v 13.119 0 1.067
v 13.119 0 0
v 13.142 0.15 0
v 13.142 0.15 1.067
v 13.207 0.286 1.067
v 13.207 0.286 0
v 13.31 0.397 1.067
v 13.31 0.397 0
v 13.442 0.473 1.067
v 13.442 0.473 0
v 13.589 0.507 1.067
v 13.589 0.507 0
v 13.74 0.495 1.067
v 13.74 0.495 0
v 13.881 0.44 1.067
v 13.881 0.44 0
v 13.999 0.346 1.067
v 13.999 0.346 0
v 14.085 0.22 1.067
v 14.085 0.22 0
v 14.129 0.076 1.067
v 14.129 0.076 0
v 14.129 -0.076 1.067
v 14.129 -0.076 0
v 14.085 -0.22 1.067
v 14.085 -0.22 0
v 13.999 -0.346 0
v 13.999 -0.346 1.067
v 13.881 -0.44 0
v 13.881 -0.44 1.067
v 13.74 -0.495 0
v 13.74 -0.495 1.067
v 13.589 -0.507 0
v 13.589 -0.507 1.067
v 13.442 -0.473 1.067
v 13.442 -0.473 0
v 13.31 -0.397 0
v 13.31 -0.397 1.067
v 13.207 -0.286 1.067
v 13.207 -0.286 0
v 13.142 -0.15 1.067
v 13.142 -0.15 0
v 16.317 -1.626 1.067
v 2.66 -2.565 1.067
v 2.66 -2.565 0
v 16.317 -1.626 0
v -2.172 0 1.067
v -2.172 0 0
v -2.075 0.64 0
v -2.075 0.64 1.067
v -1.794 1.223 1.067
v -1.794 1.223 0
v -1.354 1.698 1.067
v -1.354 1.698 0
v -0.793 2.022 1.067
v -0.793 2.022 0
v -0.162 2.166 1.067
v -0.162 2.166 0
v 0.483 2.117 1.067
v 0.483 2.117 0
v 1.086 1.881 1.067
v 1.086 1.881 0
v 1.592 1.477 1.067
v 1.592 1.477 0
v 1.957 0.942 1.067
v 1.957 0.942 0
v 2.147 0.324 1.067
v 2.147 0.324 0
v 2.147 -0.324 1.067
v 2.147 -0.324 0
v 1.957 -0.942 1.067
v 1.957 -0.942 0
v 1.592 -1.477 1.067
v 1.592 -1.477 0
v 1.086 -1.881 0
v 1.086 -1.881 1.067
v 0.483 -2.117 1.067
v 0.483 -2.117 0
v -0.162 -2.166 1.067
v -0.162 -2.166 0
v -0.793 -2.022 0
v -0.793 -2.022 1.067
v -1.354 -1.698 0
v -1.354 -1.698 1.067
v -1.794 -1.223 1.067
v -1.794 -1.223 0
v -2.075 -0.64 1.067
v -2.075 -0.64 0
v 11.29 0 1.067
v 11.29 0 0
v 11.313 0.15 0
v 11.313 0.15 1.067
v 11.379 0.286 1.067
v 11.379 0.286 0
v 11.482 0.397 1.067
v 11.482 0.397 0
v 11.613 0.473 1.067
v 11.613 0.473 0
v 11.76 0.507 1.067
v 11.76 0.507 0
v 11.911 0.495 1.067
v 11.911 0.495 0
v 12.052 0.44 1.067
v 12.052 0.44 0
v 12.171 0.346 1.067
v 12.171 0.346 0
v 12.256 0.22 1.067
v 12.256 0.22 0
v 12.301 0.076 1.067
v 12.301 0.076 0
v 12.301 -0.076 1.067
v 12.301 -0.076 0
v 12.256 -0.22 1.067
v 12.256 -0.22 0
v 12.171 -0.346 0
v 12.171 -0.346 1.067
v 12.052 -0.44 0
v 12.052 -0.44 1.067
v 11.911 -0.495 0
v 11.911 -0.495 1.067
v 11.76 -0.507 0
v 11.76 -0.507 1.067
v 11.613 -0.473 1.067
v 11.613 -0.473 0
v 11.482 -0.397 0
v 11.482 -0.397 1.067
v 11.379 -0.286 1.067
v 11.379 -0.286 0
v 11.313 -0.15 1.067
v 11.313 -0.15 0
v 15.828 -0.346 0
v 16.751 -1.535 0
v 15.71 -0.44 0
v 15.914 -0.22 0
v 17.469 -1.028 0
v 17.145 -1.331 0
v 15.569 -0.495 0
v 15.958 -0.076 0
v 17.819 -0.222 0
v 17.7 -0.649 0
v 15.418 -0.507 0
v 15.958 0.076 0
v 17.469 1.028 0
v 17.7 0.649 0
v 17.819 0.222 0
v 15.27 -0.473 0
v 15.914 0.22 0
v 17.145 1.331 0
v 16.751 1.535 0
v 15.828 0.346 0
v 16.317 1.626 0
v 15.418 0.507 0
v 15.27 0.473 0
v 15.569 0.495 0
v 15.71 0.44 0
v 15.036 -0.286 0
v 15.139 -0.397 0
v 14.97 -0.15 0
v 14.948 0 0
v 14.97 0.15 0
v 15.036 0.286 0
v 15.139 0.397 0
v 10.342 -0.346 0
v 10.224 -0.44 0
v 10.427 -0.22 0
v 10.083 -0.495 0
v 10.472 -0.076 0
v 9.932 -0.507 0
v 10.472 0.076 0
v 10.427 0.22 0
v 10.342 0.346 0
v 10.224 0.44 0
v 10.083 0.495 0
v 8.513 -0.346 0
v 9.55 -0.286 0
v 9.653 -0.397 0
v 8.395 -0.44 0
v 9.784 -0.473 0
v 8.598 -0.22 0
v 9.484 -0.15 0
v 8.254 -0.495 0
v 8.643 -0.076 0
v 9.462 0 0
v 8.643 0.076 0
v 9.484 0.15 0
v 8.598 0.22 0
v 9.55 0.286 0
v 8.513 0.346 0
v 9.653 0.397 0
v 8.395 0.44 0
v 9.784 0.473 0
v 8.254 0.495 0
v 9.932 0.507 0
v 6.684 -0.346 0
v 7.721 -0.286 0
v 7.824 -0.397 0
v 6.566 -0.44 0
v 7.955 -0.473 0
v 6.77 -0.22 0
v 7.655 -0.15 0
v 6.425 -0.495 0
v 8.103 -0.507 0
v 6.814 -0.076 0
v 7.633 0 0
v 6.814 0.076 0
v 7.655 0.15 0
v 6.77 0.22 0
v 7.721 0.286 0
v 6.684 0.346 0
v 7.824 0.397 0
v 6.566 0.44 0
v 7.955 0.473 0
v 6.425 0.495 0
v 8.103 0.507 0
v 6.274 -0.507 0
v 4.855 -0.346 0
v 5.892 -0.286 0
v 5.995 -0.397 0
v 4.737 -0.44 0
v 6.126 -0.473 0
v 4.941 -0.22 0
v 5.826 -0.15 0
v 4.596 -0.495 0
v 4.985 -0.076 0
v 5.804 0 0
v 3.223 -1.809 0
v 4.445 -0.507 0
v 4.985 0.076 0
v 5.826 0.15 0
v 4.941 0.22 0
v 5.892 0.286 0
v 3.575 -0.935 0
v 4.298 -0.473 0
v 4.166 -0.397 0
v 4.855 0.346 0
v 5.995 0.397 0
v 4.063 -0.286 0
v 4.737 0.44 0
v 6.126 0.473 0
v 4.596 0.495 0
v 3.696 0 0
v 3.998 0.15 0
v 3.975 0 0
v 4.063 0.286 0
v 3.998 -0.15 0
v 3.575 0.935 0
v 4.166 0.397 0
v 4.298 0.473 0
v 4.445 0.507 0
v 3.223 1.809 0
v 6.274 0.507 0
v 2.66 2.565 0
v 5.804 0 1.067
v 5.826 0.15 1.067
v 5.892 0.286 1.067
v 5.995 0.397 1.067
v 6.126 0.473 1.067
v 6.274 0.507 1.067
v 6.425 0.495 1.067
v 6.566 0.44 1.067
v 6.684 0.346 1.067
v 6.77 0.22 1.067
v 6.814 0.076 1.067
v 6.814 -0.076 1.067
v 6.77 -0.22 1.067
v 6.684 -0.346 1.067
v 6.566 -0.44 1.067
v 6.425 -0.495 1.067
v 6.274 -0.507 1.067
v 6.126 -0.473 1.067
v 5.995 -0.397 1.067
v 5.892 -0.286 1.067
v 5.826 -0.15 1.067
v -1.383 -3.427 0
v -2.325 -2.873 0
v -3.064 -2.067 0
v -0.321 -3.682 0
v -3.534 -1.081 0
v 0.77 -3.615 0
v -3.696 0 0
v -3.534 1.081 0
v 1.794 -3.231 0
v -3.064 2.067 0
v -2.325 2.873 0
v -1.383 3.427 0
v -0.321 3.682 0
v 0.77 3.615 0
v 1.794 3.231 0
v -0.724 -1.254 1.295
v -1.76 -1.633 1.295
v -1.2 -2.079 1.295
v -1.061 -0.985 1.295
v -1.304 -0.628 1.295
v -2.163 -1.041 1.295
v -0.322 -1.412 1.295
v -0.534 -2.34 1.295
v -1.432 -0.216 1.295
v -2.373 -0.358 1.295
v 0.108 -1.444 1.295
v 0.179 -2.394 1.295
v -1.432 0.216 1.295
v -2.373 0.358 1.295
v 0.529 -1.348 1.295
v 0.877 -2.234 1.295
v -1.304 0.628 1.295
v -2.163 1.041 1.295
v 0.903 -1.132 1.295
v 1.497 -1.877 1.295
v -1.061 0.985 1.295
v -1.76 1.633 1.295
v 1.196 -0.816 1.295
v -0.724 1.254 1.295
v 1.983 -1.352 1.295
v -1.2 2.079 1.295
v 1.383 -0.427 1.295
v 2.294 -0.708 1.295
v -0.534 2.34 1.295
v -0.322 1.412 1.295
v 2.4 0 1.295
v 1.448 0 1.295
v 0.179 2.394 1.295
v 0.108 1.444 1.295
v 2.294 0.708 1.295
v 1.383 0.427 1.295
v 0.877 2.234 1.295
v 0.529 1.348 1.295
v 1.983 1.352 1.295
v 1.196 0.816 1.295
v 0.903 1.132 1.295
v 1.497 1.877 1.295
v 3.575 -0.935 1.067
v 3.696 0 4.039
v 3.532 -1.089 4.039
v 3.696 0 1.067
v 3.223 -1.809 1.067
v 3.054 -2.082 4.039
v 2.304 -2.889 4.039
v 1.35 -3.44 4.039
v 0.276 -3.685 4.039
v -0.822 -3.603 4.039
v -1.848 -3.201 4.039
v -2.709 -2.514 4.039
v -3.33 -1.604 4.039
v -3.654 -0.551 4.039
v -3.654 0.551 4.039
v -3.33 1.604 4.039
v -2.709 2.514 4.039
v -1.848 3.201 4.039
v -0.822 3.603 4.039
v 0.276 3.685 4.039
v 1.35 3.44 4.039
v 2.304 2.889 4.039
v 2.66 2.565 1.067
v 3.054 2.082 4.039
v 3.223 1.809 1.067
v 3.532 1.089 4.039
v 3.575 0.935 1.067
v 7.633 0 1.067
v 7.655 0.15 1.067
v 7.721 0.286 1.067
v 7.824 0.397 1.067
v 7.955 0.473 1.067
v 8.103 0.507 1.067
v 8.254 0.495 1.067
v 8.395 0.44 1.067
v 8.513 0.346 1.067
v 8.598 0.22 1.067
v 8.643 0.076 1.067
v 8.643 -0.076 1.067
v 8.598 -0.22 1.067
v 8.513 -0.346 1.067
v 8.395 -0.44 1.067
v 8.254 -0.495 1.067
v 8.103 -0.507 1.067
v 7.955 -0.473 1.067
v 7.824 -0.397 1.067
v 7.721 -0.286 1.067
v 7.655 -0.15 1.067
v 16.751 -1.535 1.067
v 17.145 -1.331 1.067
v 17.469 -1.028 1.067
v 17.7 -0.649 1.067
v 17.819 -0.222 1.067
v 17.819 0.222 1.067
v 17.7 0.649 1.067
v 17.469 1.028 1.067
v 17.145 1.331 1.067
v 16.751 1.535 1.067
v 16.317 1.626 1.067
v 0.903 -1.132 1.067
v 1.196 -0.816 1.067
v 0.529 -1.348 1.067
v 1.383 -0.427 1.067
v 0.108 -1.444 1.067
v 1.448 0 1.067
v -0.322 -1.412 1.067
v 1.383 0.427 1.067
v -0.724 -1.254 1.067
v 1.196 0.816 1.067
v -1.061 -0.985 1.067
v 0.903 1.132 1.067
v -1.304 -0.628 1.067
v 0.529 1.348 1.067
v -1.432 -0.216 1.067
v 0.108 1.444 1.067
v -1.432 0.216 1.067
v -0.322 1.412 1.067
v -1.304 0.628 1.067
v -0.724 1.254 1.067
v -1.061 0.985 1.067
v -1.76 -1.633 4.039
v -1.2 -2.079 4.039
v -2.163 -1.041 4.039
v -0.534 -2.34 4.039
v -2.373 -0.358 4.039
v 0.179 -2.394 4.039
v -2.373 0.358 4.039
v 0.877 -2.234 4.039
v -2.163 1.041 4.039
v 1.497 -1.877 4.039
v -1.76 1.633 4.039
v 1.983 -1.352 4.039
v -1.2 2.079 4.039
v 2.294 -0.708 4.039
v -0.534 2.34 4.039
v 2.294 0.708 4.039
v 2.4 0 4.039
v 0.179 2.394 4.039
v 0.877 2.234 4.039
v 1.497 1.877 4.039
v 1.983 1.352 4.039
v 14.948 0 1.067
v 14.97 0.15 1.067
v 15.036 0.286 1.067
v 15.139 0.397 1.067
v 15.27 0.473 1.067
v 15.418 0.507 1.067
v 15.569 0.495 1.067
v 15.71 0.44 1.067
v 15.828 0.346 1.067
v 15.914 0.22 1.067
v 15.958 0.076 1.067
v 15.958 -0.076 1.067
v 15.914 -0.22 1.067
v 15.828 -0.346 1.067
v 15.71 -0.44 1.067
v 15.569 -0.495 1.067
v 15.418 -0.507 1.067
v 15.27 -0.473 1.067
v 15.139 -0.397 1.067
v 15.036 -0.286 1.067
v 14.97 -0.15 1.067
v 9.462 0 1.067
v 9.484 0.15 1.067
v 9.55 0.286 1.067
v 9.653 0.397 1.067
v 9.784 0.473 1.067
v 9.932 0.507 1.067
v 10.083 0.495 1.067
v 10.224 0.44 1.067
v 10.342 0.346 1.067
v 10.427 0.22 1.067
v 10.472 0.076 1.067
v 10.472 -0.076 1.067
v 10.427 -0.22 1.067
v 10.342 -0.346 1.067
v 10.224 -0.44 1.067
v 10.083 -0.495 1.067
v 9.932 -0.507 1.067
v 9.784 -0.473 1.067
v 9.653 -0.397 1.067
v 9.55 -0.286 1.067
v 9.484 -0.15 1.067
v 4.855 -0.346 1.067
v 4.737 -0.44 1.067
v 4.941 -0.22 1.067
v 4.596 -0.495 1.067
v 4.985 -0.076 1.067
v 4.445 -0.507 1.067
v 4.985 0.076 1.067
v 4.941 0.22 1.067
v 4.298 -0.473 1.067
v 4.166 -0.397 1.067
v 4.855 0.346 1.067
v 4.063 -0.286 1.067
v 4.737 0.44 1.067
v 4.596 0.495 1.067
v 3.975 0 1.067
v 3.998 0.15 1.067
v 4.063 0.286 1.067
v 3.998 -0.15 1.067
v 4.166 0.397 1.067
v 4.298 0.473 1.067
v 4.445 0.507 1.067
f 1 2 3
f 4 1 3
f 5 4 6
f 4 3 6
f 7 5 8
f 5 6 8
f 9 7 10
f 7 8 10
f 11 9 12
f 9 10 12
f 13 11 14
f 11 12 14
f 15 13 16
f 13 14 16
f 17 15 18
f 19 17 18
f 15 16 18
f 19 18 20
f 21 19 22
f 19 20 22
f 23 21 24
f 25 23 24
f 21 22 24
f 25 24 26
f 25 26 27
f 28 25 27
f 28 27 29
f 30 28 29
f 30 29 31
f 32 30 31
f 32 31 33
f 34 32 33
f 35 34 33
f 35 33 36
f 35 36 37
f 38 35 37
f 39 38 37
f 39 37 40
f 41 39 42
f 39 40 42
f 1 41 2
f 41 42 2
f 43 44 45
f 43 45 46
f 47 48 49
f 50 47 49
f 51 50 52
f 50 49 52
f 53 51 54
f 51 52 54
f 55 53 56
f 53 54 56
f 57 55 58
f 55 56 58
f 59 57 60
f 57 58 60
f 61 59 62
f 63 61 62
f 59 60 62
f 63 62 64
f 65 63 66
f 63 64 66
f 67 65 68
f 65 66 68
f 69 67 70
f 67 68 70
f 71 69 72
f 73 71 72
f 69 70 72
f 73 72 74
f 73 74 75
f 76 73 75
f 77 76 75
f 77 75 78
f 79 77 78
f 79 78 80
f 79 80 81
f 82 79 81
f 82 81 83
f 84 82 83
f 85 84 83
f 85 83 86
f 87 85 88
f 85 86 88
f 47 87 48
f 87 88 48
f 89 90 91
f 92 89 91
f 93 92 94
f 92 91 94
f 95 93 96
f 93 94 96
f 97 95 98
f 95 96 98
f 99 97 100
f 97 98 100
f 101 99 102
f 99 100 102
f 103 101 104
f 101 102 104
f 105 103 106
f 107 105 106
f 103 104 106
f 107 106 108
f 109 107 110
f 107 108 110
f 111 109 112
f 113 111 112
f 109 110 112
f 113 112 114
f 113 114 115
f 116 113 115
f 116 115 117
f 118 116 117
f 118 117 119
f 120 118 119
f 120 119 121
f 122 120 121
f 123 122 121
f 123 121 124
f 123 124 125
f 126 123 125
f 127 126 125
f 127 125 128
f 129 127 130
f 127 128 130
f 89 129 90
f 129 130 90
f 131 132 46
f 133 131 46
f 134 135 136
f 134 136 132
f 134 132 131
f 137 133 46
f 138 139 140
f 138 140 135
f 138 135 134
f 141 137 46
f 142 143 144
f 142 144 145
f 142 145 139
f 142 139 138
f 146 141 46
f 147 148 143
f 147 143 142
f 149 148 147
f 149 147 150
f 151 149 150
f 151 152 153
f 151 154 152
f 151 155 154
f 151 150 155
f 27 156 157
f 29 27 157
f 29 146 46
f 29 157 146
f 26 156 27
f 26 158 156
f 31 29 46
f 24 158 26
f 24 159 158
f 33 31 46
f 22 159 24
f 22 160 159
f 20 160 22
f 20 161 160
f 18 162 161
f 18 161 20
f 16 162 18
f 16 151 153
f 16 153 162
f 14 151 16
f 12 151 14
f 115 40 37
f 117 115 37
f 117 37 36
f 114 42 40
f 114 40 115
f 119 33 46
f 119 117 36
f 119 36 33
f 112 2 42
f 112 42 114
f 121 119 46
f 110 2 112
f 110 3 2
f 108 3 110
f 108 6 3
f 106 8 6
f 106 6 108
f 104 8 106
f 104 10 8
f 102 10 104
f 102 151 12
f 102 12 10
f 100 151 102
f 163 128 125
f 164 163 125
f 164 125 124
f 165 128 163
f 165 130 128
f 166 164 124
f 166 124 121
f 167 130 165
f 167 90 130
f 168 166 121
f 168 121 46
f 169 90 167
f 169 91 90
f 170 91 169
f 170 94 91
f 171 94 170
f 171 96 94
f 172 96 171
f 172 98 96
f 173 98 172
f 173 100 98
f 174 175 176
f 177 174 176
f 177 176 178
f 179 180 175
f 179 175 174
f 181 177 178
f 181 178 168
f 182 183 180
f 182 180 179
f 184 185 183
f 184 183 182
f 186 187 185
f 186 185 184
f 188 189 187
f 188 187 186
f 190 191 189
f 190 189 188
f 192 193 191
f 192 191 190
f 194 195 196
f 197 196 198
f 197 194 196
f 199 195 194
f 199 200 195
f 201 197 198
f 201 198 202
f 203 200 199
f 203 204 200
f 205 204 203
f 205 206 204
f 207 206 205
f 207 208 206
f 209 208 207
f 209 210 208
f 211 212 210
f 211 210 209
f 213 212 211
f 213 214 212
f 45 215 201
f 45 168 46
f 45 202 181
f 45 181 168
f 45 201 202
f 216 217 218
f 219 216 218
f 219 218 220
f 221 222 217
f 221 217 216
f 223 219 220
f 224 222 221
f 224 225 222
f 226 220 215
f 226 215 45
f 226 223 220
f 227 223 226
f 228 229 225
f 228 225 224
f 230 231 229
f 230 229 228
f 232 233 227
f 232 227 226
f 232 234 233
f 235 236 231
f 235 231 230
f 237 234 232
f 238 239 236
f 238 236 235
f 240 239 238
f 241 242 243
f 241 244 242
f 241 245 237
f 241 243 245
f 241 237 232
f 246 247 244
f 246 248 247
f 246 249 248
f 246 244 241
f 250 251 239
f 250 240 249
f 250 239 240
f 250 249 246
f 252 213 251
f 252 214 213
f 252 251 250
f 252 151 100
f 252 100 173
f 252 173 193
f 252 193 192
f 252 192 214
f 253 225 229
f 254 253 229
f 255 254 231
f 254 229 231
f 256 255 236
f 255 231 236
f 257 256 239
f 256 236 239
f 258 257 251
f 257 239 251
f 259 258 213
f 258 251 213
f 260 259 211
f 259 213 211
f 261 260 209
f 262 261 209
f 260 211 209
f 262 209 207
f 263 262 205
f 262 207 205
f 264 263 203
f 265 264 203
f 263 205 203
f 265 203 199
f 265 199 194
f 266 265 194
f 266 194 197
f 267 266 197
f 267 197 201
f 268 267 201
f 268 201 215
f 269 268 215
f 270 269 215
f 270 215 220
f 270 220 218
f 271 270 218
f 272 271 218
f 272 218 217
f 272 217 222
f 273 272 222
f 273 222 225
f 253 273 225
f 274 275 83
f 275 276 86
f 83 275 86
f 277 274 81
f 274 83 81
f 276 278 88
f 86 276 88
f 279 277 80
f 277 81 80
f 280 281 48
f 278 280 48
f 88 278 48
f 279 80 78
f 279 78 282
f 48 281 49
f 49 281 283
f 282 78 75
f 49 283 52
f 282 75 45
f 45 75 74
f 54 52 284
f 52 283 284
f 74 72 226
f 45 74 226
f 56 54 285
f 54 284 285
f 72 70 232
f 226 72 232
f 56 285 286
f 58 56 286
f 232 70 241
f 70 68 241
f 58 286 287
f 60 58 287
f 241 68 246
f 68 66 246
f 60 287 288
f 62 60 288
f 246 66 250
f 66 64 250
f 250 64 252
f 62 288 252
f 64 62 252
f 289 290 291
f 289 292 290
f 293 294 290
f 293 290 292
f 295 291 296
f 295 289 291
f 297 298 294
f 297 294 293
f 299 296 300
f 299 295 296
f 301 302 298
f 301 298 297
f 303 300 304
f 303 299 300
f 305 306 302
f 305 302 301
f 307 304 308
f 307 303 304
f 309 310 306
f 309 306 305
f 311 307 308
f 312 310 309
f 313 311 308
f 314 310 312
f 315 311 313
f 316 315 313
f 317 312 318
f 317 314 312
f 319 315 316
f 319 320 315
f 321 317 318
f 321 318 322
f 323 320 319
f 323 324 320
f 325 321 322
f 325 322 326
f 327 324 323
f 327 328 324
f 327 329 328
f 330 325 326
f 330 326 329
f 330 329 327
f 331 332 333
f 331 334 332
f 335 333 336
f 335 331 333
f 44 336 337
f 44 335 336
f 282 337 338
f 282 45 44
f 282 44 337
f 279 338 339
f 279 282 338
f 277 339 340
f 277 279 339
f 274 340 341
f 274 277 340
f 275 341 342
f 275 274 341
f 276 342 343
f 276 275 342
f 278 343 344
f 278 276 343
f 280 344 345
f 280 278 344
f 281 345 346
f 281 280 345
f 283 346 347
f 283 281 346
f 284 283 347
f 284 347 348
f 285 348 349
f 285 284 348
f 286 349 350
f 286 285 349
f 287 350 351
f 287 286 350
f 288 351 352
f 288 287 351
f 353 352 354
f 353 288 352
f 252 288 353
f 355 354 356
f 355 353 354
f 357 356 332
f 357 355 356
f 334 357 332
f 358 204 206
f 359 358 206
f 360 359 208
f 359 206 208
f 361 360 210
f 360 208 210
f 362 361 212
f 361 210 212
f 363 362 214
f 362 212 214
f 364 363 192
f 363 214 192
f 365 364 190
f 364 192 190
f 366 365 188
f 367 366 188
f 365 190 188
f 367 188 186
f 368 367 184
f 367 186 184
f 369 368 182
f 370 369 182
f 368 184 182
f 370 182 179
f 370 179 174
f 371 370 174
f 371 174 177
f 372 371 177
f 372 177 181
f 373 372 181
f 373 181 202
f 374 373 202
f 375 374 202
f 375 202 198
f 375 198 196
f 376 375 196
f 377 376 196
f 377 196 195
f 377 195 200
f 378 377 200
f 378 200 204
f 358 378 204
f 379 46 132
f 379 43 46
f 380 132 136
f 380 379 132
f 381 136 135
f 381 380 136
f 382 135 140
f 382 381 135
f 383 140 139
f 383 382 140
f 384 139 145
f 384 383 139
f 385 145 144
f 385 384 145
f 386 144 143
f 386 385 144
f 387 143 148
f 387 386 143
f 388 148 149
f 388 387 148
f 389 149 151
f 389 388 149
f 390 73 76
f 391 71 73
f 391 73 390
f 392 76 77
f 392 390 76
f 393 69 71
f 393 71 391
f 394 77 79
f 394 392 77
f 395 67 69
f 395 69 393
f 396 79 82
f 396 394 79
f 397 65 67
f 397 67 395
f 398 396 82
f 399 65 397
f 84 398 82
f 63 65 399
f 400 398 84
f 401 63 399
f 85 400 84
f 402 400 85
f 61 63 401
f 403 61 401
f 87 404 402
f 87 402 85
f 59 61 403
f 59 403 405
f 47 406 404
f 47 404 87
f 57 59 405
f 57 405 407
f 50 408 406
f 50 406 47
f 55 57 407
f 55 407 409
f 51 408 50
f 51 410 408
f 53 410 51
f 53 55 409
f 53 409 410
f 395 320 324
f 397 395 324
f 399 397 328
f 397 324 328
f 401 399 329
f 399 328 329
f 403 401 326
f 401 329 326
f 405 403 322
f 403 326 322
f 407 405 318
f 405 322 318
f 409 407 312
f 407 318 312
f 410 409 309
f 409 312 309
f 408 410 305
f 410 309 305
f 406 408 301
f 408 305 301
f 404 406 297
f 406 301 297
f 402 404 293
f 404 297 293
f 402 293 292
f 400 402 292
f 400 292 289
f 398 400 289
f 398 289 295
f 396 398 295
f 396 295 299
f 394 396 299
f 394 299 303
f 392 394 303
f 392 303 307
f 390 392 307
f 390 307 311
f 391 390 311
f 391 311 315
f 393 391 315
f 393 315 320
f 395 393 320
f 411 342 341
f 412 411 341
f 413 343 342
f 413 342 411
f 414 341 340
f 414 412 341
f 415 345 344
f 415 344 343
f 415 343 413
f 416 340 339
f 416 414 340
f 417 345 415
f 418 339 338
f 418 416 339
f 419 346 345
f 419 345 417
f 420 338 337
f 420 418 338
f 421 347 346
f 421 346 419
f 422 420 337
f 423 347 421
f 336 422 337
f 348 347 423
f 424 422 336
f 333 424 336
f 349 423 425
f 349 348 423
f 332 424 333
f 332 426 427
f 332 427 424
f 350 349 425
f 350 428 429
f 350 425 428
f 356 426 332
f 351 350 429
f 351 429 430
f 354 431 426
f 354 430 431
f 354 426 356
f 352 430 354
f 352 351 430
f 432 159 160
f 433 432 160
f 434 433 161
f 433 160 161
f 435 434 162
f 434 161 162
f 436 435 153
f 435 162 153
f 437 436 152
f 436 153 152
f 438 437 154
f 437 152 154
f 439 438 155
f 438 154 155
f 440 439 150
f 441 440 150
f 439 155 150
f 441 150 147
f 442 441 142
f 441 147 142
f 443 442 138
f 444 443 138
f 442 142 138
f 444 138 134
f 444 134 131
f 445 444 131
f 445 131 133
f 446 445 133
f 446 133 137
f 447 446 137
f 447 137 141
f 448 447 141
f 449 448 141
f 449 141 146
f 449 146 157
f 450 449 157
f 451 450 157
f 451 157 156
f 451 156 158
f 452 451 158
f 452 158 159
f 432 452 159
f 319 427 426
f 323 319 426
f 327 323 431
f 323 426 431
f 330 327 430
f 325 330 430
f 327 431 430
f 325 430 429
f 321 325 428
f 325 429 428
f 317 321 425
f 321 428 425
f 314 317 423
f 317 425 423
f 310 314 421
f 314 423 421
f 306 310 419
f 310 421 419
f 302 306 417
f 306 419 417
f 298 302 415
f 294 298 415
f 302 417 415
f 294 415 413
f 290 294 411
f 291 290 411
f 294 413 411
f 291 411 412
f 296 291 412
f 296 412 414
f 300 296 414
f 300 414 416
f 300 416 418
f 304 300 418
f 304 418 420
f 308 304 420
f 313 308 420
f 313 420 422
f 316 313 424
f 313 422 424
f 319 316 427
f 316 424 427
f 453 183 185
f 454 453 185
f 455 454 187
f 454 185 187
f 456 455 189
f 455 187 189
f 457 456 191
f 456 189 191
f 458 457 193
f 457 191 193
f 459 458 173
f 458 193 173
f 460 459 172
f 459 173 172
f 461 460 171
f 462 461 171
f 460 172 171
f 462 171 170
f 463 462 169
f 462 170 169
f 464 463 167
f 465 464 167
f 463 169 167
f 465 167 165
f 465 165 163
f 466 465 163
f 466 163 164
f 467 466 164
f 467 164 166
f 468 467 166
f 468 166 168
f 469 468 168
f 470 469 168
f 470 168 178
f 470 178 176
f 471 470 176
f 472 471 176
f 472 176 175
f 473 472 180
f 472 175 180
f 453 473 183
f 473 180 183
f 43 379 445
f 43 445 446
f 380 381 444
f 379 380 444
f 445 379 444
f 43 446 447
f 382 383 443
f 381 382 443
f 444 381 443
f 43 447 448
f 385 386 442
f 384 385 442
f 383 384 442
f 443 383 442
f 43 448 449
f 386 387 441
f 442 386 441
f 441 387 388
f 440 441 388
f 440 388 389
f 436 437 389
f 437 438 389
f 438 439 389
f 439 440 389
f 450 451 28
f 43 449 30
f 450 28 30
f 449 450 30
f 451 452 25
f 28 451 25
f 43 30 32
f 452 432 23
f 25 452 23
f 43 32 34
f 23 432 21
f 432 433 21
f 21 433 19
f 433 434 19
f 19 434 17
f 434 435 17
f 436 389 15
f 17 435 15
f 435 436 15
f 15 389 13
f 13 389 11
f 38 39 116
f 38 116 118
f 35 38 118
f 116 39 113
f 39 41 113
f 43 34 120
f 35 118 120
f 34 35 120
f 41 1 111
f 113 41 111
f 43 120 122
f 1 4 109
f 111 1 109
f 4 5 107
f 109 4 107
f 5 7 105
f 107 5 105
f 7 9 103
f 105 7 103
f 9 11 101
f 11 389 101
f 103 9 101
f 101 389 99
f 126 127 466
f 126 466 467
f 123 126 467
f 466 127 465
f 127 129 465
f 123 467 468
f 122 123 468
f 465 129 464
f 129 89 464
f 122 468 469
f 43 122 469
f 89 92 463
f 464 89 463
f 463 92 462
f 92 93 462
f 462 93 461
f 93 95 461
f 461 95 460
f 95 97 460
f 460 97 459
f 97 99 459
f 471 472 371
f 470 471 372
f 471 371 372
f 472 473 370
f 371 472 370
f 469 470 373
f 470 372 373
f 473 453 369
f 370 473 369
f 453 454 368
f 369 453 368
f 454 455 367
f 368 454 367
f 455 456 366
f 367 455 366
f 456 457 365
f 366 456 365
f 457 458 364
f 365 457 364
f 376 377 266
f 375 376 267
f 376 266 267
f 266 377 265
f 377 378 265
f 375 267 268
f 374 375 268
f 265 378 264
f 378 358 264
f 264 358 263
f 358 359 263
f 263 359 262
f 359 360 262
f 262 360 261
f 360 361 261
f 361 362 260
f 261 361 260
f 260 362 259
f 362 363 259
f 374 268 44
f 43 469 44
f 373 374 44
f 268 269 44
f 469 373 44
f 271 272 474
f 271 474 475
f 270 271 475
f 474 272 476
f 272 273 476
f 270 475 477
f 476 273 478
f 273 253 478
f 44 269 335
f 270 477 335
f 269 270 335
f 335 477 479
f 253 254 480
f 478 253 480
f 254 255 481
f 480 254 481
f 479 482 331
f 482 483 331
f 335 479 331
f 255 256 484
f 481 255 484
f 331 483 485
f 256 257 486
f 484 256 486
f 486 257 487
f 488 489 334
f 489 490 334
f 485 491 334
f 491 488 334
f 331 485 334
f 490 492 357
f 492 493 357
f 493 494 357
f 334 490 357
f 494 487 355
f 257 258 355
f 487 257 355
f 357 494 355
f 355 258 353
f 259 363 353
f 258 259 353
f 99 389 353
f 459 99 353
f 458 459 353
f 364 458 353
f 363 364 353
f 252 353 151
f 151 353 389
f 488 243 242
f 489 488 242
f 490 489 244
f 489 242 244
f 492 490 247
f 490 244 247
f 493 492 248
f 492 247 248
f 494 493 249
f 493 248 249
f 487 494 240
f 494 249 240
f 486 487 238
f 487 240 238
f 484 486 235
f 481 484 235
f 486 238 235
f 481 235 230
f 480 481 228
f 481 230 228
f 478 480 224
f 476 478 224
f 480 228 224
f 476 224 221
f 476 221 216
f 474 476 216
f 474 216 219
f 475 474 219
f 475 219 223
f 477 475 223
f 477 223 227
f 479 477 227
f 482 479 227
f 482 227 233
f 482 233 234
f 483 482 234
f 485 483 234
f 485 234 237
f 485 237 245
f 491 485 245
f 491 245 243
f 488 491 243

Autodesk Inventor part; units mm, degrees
ref_plane "YZ Plane" through (0, 0, 0) normal (1, 0, 0) x (0, 1, 0)
ref_plane "XZ Plane" through (0, 0, 0) normal (0, 1, 0) x (-1, 0, 0)
ref_plane "XY Plane" through (0, 0, 0) normal (0, 0, 1) x (1, 0, 0)
sketch "Sketch1" plane through (0, 0, 0) normal (0, 0, 1) x (1, 0, 0)
  circle A0 centre (0, 0) radius 3.6957
  dimension "d0" = 7.3914
extrude "Extrusion1" add sketch "Sketch1" along normal blind 4.0386
sketch "Sketch2" plane through (0, 0, 4.0386) normal (0, 0, 1) x (1, 0, 0)
  circle A0 centre (0, 0) radius 3.6957 projected
  circle A1 centre (0, 0) radius 2.4003
  dimension "d3" = 1.2954
extrude "Extrusion2" cut sketch "Sketch2" against normal blind 2.7432 contours A1
sketch "Sketch3" plane through (0, 0, 0) normal (0, 0, -1) x (-1, 0, 0)
  circle A0 centre (0, 0) radius 3.6957 projected
  circle A1 centre (0, 0) radius 2.1717
  dimension "d6" = 1.524
extrude "Extrusion3" cut sketch "Sketch3" against normal blind 1.0668 contours A1
sketch "Sketch4" plane through (0, 0, 1.2954) normal (0, 0, 1) x (1, 0, 0)
  circle A0 centre (0, 0) radius 2.4003 projected
  circle A1 centre (0, 0) radius 1.4478
  dimension "d9" = 2.8956
extrude "Extrusion4" cut sketch "Sketch4" against normal through all contours A1
ref_plane "Work Plane1" through (0, 0, 0.5334) normal (0, 0, -1) x (-1, 0, 0)
sketch "Sketch5" plane through (0, 0, 0.5334) normal (0, 0, -1) x (-1, 0, 0)
  circle A0 centre (0, 0) radius 3.6957 projected
  line L0 (-2.6602, 2.5654) -> (-16.3171, 1.6256)
  line L1 (-2.6602, -2.5654) -> (-16.3171, -1.6256)
  arc A1 (-16.3171, 1.6256) -> (-16.3171, -1.6256) centre (-16.2052, 0) ccw
  circle A2 centre (0, 0) radius 2.4003 projected
  line L2 (2.6602, 2.5654) -> (16.3171, 1.6256)
  arc A3 (16.3171, -1.6256) -> (16.3171, 1.6256) centre (16.2052, 0) ccw
  line L3 (2.6602, -2.5654) -> (16.3171, -1.6256)
  dimension "d12" = 5.1308
  dimension "d15" = 16.2052
  dimension "d28" = 360
  dimension "d35" = 3.2512
extrude "Extrusion5" add sketch "Sketch5" along normal mid plane 1.0668 contours A0 L1 A1 L0
sketch "Sketch6" plane through (0, 0, 0) normal (0, 0, -1) x (-1, 0, 0)
  circle A0 centre (0, 0) radius 2.1717 projected
  circle A1 centre (-4.4831, 0) radius 0.508
  dimension "d36" = 1.8034
  dimension "d37" = 1.016
extrude "Extrusion6" cut sketch "Sketch6" against normal through all contours A1
pattern_linear "Rectangular Pattern1" count 7 spacing 1.8288 along (1, 0, 0) of "Extrusion6"
properties part number "singleSideCutoff"
